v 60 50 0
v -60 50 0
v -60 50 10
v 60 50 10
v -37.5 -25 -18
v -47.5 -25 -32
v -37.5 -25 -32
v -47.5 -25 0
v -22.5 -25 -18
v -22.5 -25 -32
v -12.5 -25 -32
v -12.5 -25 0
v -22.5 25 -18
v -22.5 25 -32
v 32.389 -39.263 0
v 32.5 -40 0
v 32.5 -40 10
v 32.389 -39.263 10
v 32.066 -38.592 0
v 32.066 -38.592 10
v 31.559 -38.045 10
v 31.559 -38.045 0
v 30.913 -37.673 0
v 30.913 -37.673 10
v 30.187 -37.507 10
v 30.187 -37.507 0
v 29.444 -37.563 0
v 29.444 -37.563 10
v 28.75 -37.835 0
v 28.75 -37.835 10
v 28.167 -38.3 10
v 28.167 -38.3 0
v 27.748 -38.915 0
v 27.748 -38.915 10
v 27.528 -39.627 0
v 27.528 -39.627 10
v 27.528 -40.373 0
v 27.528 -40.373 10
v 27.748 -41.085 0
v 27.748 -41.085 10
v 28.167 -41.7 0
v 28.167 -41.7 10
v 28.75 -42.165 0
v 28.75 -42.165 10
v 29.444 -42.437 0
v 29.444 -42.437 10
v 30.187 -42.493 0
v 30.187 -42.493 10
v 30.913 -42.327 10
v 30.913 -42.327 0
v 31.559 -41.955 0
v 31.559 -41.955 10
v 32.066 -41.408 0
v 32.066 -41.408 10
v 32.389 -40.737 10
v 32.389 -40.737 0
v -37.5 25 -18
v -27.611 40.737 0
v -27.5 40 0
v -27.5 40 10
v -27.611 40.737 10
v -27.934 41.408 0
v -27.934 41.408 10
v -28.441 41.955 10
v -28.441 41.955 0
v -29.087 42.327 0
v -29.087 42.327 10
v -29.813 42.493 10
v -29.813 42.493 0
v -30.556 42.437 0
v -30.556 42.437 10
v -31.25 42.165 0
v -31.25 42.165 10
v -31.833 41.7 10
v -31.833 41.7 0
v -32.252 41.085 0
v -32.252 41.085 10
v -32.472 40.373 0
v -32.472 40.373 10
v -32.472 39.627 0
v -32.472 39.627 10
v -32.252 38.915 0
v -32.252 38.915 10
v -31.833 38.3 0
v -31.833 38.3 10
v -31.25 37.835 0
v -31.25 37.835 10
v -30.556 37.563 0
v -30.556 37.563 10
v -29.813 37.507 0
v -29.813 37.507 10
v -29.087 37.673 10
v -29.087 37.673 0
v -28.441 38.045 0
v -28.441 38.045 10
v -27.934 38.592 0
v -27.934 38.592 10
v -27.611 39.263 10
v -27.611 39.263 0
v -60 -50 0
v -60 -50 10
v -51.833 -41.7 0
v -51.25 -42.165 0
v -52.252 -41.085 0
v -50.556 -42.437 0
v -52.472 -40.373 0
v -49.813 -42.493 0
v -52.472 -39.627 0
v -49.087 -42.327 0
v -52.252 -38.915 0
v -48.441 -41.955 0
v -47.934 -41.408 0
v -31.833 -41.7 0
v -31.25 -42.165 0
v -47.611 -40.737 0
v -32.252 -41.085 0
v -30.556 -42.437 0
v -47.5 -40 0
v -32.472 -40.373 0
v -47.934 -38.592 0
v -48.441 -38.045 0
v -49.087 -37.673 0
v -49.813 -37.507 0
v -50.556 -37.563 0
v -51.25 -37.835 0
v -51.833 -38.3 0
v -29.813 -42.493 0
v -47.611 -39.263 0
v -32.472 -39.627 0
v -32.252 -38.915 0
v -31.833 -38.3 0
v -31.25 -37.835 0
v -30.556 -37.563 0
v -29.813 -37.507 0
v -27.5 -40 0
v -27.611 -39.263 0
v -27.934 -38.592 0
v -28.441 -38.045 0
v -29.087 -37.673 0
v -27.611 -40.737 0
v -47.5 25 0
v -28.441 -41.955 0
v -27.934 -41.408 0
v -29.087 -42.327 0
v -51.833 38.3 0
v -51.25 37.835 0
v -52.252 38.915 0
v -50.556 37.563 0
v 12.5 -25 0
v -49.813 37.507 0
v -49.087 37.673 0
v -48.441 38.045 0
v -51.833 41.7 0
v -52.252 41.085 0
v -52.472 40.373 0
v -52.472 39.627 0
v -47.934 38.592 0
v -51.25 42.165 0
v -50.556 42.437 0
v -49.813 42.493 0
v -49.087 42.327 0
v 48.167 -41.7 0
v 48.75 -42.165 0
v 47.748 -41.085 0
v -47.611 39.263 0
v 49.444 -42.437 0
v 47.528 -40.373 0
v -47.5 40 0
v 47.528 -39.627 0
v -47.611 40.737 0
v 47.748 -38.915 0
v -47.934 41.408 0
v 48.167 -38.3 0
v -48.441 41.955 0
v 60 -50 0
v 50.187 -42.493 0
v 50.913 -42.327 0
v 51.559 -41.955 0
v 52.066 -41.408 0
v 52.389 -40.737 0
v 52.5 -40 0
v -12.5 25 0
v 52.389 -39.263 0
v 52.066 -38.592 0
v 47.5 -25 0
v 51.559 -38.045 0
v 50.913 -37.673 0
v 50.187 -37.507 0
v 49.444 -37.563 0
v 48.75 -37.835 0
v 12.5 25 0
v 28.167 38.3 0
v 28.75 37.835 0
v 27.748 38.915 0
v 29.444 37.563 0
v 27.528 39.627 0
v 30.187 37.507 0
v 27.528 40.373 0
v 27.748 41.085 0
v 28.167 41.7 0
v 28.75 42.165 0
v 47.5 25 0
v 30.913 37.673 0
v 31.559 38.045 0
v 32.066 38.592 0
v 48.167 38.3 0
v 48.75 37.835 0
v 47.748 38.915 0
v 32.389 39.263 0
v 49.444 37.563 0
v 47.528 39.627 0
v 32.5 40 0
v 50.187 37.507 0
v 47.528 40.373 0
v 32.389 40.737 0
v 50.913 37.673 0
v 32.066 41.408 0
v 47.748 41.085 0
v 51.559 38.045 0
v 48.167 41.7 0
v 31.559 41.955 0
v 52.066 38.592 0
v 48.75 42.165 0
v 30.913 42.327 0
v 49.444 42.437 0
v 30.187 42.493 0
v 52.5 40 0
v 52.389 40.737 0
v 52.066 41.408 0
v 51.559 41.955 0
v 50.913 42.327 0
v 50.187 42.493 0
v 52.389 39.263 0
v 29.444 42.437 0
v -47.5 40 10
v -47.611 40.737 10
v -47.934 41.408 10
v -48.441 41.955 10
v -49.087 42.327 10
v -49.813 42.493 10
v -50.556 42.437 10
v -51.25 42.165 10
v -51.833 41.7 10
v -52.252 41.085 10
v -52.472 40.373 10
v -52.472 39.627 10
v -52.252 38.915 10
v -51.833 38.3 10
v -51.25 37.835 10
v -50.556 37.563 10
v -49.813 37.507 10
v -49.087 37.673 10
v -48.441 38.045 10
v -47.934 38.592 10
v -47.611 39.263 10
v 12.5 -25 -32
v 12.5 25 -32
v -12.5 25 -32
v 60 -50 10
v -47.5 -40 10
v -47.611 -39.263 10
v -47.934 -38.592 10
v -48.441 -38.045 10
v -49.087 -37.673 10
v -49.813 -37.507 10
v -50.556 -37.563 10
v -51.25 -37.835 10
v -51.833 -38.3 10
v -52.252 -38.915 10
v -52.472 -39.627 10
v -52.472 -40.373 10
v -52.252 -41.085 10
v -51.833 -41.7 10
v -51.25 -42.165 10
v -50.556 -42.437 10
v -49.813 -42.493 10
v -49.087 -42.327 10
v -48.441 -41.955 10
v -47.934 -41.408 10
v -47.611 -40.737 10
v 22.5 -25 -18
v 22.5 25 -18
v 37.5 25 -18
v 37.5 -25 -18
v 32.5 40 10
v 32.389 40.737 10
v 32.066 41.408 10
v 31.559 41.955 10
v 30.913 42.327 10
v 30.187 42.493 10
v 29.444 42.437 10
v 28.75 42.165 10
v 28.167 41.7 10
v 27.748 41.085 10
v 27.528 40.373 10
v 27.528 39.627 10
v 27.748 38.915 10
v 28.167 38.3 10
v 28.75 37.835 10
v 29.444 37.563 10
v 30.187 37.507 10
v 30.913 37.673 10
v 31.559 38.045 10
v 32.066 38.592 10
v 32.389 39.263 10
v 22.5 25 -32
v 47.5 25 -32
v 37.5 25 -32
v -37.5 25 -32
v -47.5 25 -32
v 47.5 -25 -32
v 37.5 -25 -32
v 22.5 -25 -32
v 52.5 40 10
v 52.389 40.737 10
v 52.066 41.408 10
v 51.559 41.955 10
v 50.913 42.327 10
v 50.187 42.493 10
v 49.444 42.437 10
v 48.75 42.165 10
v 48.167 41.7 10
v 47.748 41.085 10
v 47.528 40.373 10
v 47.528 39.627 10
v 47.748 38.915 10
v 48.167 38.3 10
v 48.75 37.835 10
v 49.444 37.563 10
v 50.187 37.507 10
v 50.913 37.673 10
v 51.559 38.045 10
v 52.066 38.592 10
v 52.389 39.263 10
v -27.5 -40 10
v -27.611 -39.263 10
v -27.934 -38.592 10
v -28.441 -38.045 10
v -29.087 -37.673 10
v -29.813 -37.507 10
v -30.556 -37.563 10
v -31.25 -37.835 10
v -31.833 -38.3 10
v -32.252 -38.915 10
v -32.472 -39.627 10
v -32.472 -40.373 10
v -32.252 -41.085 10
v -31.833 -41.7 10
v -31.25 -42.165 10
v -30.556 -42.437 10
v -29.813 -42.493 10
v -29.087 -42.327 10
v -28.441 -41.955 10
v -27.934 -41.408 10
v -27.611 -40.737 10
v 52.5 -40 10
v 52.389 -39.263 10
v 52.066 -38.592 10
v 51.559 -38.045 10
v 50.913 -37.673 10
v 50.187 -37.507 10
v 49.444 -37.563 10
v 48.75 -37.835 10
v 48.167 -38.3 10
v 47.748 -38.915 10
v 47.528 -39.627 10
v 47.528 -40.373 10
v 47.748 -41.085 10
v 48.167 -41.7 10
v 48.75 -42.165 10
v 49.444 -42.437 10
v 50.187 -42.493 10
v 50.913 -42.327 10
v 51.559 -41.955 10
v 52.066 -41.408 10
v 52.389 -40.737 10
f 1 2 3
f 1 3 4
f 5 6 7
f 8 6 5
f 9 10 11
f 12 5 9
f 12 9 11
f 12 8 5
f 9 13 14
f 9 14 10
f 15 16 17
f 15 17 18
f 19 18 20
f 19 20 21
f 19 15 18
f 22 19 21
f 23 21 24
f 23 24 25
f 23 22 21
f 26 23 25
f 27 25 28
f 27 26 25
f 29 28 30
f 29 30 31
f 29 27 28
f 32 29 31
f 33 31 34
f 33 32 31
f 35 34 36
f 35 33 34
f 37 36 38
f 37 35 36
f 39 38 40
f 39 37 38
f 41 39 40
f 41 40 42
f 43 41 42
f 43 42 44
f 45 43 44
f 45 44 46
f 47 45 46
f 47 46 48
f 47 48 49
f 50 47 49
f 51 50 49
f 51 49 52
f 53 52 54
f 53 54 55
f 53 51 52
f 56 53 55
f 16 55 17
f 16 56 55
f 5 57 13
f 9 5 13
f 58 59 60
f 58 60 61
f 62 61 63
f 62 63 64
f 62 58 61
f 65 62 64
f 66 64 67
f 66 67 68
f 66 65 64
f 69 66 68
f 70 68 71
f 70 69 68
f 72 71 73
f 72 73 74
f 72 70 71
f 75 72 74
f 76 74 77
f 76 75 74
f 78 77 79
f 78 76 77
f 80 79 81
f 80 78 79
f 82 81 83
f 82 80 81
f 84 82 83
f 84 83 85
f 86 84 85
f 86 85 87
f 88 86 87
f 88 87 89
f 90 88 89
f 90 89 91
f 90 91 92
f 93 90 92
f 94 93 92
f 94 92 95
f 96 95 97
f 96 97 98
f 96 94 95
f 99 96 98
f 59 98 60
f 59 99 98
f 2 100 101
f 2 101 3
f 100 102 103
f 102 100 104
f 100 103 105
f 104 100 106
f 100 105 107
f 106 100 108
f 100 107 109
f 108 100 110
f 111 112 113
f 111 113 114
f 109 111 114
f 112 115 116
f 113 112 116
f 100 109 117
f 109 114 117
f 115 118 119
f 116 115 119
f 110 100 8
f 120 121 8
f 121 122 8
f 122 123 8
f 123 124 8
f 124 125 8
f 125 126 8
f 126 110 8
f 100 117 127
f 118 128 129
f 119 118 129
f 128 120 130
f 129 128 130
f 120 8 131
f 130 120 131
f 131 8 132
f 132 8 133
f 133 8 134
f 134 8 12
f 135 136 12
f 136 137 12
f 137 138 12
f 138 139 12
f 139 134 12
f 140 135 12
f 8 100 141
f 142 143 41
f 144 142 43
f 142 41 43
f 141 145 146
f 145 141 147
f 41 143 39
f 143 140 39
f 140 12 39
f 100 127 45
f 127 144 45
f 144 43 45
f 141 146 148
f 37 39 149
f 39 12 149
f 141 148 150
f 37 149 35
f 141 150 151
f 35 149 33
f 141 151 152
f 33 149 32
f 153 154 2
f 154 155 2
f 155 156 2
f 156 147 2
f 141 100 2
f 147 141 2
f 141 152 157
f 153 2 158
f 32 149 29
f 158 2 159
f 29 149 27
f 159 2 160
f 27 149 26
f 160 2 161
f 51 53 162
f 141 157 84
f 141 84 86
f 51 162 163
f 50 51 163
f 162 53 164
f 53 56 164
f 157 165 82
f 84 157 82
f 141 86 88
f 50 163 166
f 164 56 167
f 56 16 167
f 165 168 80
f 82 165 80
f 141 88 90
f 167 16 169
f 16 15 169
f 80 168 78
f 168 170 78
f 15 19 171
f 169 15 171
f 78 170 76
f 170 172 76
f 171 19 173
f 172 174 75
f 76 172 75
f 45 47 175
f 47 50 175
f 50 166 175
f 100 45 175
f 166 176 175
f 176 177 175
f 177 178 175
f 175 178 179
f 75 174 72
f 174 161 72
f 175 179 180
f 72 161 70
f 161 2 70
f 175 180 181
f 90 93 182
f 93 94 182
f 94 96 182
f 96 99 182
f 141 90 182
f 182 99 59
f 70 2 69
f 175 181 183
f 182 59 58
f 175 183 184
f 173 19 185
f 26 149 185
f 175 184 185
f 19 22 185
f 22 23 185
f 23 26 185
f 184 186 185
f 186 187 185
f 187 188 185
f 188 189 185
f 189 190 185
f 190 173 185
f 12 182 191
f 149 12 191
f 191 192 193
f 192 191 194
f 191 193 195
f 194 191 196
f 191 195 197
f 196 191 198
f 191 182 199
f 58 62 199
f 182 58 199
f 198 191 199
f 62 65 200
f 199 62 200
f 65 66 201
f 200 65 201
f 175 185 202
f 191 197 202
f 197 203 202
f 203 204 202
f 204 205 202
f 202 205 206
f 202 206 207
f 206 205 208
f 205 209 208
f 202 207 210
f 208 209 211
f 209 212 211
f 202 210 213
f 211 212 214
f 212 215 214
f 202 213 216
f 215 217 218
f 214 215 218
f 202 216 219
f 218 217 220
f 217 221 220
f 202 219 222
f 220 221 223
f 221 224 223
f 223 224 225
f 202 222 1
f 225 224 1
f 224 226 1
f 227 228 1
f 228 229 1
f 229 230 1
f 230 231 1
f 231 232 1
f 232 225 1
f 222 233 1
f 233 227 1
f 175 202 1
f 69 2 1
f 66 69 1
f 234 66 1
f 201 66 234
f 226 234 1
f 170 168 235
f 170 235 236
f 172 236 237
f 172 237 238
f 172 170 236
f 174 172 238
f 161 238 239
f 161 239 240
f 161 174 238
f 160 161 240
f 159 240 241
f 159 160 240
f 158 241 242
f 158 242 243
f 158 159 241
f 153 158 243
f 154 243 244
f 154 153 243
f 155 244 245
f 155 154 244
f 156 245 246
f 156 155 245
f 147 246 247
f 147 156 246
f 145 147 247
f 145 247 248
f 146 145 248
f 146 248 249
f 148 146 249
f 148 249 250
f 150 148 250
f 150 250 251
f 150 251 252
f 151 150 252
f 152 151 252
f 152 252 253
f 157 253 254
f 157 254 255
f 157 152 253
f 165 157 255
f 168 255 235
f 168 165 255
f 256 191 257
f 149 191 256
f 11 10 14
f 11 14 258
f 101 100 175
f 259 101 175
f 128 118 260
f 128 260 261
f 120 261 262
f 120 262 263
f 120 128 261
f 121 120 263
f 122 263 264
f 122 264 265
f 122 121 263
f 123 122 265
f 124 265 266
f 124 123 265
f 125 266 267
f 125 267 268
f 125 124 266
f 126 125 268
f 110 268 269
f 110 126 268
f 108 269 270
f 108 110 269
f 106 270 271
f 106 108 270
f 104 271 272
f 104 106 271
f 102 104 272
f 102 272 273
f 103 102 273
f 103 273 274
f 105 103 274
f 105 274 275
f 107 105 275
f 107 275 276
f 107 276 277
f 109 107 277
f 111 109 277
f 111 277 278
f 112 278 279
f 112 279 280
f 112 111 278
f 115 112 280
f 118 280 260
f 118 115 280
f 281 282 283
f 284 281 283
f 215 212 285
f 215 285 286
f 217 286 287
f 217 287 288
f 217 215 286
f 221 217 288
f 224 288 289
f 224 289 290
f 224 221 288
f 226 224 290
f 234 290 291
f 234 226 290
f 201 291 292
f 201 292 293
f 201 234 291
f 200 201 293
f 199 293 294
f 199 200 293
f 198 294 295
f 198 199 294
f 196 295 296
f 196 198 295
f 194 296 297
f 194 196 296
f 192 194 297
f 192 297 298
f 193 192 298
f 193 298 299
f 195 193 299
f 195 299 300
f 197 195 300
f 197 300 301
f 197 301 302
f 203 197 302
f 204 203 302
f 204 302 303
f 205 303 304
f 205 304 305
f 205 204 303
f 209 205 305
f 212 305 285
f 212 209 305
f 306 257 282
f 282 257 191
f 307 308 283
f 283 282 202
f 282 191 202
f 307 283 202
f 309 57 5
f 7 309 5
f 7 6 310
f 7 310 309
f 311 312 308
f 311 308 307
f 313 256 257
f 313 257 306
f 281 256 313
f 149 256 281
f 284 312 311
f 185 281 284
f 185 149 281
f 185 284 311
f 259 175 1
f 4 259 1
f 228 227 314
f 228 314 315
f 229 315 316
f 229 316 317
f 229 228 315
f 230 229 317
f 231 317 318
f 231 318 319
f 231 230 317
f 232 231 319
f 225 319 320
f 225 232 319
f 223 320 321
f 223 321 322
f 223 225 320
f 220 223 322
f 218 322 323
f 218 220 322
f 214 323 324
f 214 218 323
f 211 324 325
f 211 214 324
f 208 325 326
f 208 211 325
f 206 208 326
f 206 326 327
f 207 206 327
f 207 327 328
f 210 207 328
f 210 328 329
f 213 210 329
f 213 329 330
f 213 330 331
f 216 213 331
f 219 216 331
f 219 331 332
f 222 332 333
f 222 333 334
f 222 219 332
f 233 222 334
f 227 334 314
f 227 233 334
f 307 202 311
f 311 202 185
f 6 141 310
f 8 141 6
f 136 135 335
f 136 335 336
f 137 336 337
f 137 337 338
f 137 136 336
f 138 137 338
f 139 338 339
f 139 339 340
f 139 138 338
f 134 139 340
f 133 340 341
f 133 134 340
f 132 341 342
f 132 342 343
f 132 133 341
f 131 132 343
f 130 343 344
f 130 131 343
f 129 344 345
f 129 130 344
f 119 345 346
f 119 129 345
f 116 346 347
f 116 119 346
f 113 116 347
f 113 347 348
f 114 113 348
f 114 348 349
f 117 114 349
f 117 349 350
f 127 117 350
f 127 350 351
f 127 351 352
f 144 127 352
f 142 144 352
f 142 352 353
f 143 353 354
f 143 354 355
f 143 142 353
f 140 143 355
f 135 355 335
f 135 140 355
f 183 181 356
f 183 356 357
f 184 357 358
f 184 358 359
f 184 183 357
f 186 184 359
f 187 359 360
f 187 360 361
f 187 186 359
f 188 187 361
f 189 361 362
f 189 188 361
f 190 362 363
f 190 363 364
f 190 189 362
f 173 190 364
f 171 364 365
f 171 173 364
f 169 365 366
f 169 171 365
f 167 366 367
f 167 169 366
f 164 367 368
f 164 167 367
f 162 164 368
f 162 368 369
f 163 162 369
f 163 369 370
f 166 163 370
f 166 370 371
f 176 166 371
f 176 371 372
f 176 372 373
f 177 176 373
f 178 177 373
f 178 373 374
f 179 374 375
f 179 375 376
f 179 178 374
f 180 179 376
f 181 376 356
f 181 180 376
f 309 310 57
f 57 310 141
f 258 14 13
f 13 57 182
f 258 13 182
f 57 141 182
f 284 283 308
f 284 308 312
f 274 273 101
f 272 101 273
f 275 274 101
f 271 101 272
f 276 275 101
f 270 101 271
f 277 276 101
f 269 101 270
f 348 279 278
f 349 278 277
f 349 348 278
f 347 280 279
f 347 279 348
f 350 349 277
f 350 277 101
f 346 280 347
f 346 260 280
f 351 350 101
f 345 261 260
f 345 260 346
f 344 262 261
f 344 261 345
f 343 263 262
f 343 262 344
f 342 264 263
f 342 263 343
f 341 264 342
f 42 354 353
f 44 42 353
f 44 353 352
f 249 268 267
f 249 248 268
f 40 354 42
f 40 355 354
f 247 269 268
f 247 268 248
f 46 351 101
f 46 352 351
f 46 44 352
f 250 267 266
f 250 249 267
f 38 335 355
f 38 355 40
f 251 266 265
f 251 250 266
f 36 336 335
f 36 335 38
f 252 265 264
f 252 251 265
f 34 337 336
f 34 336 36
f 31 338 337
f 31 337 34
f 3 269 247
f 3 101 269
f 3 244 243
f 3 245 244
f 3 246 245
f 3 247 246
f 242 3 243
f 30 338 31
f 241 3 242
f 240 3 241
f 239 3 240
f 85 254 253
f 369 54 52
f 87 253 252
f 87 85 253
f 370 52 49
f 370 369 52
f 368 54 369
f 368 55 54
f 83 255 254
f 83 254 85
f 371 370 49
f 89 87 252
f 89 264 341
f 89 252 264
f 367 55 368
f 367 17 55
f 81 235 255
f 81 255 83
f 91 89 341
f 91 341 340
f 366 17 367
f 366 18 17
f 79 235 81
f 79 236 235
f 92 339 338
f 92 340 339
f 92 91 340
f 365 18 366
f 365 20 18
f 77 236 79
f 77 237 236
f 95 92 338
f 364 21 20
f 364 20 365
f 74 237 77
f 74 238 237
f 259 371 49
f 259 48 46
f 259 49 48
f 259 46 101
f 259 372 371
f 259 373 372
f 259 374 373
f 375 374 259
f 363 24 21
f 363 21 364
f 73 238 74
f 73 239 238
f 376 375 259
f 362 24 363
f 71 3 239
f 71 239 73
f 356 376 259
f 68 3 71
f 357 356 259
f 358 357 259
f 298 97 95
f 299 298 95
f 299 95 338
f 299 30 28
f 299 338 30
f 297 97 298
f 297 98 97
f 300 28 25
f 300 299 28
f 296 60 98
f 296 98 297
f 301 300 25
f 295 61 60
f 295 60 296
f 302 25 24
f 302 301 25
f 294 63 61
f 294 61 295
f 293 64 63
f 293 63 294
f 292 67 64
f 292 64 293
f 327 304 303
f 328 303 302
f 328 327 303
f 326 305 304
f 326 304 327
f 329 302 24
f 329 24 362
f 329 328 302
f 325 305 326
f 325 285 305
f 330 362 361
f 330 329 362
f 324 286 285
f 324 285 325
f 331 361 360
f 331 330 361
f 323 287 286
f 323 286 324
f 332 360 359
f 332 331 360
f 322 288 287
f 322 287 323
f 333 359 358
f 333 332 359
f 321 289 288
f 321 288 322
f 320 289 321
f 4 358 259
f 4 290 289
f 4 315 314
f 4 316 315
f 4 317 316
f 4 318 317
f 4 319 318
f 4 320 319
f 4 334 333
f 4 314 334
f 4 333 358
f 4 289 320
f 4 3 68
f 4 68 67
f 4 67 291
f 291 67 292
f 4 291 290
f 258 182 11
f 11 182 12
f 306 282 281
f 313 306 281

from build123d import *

# Parameters (mm, degrees)
SKETCH_W     = 120
SKETCH_H     = 100
SKETCH_R     = 2.5
PAD_DEPTH    = 10
SKETCH001_W  = 35
SKETCH001_H  = 50
PAD001_DEPTH = 18
SKETCH002_W  = 10
SKETCH002_H  = 50
PAD002_DEPTH = 14


with BuildPart() as part:
    # Sketch → Pad (new body)
    with BuildSketch(Plane.XY):
        Rectangle(SKETCH_W, SKETCH_H)
        with Locations((-50, 40)):
            Circle(SKETCH_R, mode=Mode.SUBTRACT)
        with Locations((-30, 40)):
            Circle(SKETCH_R, mode=Mode.SUBTRACT)
        with Locations((30, 40)):
            Circle(SKETCH_R, mode=Mode.SUBTRACT)
        with Locations((50, 40)):
            Circle(SKETCH_R, mode=Mode.SUBTRACT)
        with Locations((-50, -40)):
            Circle(SKETCH_R, mode=Mode.SUBTRACT)
        with Locations((-30, -40)):
            Circle(SKETCH_R, mode=Mode.SUBTRACT)
        with Locations((30, -40)):
            Circle(SKETCH_R, mode=Mode.SUBTRACT)
        with Locations((50, -40)):
            Circle(SKETCH_R, mode=Mode.SUBTRACT)
    extrude(amount=PAD_DEPTH)

    # Sketch001 (on Face13 of Pad) → Pad001 (join)
    with BuildSketch(Plane(origin=(0, 0, 0), x_dir=(1, 0, 0), z_dir=(0, 0, -1))):
        with Locations((-30, 0)):
            Rectangle(SKETCH001_W, SKETCH001_H)
        with Locations((30, 0)):
            Rectangle(SKETCH001_W, SKETCH001_H)
    extrude(amount=PAD001_DEPTH)

    # Sketch002 (on Face23 of Pad001) → Pad002 (join)
    with BuildSketch(Plane(origin=(0, 0, -18), x_dir=(1, 0, 0), z_dir=(0, 0, -1))):
        with Locations((-42.5, 0)):
            Rectangle(SKETCH002_W, SKETCH002_H)
        with Locations((-17.5, 0)):
            Rectangle(SKETCH002_W, SKETCH002_H)
        with Locations((17.5, 0)):
            Rectangle(SKETCH002_W, SKETCH002_H)
        with Locations((42.5, 0)):
            Rectangle(SKETCH002_W, SKETCH002_H)
    extrude(amount=PAD002_DEPTH)


solid = part.part
